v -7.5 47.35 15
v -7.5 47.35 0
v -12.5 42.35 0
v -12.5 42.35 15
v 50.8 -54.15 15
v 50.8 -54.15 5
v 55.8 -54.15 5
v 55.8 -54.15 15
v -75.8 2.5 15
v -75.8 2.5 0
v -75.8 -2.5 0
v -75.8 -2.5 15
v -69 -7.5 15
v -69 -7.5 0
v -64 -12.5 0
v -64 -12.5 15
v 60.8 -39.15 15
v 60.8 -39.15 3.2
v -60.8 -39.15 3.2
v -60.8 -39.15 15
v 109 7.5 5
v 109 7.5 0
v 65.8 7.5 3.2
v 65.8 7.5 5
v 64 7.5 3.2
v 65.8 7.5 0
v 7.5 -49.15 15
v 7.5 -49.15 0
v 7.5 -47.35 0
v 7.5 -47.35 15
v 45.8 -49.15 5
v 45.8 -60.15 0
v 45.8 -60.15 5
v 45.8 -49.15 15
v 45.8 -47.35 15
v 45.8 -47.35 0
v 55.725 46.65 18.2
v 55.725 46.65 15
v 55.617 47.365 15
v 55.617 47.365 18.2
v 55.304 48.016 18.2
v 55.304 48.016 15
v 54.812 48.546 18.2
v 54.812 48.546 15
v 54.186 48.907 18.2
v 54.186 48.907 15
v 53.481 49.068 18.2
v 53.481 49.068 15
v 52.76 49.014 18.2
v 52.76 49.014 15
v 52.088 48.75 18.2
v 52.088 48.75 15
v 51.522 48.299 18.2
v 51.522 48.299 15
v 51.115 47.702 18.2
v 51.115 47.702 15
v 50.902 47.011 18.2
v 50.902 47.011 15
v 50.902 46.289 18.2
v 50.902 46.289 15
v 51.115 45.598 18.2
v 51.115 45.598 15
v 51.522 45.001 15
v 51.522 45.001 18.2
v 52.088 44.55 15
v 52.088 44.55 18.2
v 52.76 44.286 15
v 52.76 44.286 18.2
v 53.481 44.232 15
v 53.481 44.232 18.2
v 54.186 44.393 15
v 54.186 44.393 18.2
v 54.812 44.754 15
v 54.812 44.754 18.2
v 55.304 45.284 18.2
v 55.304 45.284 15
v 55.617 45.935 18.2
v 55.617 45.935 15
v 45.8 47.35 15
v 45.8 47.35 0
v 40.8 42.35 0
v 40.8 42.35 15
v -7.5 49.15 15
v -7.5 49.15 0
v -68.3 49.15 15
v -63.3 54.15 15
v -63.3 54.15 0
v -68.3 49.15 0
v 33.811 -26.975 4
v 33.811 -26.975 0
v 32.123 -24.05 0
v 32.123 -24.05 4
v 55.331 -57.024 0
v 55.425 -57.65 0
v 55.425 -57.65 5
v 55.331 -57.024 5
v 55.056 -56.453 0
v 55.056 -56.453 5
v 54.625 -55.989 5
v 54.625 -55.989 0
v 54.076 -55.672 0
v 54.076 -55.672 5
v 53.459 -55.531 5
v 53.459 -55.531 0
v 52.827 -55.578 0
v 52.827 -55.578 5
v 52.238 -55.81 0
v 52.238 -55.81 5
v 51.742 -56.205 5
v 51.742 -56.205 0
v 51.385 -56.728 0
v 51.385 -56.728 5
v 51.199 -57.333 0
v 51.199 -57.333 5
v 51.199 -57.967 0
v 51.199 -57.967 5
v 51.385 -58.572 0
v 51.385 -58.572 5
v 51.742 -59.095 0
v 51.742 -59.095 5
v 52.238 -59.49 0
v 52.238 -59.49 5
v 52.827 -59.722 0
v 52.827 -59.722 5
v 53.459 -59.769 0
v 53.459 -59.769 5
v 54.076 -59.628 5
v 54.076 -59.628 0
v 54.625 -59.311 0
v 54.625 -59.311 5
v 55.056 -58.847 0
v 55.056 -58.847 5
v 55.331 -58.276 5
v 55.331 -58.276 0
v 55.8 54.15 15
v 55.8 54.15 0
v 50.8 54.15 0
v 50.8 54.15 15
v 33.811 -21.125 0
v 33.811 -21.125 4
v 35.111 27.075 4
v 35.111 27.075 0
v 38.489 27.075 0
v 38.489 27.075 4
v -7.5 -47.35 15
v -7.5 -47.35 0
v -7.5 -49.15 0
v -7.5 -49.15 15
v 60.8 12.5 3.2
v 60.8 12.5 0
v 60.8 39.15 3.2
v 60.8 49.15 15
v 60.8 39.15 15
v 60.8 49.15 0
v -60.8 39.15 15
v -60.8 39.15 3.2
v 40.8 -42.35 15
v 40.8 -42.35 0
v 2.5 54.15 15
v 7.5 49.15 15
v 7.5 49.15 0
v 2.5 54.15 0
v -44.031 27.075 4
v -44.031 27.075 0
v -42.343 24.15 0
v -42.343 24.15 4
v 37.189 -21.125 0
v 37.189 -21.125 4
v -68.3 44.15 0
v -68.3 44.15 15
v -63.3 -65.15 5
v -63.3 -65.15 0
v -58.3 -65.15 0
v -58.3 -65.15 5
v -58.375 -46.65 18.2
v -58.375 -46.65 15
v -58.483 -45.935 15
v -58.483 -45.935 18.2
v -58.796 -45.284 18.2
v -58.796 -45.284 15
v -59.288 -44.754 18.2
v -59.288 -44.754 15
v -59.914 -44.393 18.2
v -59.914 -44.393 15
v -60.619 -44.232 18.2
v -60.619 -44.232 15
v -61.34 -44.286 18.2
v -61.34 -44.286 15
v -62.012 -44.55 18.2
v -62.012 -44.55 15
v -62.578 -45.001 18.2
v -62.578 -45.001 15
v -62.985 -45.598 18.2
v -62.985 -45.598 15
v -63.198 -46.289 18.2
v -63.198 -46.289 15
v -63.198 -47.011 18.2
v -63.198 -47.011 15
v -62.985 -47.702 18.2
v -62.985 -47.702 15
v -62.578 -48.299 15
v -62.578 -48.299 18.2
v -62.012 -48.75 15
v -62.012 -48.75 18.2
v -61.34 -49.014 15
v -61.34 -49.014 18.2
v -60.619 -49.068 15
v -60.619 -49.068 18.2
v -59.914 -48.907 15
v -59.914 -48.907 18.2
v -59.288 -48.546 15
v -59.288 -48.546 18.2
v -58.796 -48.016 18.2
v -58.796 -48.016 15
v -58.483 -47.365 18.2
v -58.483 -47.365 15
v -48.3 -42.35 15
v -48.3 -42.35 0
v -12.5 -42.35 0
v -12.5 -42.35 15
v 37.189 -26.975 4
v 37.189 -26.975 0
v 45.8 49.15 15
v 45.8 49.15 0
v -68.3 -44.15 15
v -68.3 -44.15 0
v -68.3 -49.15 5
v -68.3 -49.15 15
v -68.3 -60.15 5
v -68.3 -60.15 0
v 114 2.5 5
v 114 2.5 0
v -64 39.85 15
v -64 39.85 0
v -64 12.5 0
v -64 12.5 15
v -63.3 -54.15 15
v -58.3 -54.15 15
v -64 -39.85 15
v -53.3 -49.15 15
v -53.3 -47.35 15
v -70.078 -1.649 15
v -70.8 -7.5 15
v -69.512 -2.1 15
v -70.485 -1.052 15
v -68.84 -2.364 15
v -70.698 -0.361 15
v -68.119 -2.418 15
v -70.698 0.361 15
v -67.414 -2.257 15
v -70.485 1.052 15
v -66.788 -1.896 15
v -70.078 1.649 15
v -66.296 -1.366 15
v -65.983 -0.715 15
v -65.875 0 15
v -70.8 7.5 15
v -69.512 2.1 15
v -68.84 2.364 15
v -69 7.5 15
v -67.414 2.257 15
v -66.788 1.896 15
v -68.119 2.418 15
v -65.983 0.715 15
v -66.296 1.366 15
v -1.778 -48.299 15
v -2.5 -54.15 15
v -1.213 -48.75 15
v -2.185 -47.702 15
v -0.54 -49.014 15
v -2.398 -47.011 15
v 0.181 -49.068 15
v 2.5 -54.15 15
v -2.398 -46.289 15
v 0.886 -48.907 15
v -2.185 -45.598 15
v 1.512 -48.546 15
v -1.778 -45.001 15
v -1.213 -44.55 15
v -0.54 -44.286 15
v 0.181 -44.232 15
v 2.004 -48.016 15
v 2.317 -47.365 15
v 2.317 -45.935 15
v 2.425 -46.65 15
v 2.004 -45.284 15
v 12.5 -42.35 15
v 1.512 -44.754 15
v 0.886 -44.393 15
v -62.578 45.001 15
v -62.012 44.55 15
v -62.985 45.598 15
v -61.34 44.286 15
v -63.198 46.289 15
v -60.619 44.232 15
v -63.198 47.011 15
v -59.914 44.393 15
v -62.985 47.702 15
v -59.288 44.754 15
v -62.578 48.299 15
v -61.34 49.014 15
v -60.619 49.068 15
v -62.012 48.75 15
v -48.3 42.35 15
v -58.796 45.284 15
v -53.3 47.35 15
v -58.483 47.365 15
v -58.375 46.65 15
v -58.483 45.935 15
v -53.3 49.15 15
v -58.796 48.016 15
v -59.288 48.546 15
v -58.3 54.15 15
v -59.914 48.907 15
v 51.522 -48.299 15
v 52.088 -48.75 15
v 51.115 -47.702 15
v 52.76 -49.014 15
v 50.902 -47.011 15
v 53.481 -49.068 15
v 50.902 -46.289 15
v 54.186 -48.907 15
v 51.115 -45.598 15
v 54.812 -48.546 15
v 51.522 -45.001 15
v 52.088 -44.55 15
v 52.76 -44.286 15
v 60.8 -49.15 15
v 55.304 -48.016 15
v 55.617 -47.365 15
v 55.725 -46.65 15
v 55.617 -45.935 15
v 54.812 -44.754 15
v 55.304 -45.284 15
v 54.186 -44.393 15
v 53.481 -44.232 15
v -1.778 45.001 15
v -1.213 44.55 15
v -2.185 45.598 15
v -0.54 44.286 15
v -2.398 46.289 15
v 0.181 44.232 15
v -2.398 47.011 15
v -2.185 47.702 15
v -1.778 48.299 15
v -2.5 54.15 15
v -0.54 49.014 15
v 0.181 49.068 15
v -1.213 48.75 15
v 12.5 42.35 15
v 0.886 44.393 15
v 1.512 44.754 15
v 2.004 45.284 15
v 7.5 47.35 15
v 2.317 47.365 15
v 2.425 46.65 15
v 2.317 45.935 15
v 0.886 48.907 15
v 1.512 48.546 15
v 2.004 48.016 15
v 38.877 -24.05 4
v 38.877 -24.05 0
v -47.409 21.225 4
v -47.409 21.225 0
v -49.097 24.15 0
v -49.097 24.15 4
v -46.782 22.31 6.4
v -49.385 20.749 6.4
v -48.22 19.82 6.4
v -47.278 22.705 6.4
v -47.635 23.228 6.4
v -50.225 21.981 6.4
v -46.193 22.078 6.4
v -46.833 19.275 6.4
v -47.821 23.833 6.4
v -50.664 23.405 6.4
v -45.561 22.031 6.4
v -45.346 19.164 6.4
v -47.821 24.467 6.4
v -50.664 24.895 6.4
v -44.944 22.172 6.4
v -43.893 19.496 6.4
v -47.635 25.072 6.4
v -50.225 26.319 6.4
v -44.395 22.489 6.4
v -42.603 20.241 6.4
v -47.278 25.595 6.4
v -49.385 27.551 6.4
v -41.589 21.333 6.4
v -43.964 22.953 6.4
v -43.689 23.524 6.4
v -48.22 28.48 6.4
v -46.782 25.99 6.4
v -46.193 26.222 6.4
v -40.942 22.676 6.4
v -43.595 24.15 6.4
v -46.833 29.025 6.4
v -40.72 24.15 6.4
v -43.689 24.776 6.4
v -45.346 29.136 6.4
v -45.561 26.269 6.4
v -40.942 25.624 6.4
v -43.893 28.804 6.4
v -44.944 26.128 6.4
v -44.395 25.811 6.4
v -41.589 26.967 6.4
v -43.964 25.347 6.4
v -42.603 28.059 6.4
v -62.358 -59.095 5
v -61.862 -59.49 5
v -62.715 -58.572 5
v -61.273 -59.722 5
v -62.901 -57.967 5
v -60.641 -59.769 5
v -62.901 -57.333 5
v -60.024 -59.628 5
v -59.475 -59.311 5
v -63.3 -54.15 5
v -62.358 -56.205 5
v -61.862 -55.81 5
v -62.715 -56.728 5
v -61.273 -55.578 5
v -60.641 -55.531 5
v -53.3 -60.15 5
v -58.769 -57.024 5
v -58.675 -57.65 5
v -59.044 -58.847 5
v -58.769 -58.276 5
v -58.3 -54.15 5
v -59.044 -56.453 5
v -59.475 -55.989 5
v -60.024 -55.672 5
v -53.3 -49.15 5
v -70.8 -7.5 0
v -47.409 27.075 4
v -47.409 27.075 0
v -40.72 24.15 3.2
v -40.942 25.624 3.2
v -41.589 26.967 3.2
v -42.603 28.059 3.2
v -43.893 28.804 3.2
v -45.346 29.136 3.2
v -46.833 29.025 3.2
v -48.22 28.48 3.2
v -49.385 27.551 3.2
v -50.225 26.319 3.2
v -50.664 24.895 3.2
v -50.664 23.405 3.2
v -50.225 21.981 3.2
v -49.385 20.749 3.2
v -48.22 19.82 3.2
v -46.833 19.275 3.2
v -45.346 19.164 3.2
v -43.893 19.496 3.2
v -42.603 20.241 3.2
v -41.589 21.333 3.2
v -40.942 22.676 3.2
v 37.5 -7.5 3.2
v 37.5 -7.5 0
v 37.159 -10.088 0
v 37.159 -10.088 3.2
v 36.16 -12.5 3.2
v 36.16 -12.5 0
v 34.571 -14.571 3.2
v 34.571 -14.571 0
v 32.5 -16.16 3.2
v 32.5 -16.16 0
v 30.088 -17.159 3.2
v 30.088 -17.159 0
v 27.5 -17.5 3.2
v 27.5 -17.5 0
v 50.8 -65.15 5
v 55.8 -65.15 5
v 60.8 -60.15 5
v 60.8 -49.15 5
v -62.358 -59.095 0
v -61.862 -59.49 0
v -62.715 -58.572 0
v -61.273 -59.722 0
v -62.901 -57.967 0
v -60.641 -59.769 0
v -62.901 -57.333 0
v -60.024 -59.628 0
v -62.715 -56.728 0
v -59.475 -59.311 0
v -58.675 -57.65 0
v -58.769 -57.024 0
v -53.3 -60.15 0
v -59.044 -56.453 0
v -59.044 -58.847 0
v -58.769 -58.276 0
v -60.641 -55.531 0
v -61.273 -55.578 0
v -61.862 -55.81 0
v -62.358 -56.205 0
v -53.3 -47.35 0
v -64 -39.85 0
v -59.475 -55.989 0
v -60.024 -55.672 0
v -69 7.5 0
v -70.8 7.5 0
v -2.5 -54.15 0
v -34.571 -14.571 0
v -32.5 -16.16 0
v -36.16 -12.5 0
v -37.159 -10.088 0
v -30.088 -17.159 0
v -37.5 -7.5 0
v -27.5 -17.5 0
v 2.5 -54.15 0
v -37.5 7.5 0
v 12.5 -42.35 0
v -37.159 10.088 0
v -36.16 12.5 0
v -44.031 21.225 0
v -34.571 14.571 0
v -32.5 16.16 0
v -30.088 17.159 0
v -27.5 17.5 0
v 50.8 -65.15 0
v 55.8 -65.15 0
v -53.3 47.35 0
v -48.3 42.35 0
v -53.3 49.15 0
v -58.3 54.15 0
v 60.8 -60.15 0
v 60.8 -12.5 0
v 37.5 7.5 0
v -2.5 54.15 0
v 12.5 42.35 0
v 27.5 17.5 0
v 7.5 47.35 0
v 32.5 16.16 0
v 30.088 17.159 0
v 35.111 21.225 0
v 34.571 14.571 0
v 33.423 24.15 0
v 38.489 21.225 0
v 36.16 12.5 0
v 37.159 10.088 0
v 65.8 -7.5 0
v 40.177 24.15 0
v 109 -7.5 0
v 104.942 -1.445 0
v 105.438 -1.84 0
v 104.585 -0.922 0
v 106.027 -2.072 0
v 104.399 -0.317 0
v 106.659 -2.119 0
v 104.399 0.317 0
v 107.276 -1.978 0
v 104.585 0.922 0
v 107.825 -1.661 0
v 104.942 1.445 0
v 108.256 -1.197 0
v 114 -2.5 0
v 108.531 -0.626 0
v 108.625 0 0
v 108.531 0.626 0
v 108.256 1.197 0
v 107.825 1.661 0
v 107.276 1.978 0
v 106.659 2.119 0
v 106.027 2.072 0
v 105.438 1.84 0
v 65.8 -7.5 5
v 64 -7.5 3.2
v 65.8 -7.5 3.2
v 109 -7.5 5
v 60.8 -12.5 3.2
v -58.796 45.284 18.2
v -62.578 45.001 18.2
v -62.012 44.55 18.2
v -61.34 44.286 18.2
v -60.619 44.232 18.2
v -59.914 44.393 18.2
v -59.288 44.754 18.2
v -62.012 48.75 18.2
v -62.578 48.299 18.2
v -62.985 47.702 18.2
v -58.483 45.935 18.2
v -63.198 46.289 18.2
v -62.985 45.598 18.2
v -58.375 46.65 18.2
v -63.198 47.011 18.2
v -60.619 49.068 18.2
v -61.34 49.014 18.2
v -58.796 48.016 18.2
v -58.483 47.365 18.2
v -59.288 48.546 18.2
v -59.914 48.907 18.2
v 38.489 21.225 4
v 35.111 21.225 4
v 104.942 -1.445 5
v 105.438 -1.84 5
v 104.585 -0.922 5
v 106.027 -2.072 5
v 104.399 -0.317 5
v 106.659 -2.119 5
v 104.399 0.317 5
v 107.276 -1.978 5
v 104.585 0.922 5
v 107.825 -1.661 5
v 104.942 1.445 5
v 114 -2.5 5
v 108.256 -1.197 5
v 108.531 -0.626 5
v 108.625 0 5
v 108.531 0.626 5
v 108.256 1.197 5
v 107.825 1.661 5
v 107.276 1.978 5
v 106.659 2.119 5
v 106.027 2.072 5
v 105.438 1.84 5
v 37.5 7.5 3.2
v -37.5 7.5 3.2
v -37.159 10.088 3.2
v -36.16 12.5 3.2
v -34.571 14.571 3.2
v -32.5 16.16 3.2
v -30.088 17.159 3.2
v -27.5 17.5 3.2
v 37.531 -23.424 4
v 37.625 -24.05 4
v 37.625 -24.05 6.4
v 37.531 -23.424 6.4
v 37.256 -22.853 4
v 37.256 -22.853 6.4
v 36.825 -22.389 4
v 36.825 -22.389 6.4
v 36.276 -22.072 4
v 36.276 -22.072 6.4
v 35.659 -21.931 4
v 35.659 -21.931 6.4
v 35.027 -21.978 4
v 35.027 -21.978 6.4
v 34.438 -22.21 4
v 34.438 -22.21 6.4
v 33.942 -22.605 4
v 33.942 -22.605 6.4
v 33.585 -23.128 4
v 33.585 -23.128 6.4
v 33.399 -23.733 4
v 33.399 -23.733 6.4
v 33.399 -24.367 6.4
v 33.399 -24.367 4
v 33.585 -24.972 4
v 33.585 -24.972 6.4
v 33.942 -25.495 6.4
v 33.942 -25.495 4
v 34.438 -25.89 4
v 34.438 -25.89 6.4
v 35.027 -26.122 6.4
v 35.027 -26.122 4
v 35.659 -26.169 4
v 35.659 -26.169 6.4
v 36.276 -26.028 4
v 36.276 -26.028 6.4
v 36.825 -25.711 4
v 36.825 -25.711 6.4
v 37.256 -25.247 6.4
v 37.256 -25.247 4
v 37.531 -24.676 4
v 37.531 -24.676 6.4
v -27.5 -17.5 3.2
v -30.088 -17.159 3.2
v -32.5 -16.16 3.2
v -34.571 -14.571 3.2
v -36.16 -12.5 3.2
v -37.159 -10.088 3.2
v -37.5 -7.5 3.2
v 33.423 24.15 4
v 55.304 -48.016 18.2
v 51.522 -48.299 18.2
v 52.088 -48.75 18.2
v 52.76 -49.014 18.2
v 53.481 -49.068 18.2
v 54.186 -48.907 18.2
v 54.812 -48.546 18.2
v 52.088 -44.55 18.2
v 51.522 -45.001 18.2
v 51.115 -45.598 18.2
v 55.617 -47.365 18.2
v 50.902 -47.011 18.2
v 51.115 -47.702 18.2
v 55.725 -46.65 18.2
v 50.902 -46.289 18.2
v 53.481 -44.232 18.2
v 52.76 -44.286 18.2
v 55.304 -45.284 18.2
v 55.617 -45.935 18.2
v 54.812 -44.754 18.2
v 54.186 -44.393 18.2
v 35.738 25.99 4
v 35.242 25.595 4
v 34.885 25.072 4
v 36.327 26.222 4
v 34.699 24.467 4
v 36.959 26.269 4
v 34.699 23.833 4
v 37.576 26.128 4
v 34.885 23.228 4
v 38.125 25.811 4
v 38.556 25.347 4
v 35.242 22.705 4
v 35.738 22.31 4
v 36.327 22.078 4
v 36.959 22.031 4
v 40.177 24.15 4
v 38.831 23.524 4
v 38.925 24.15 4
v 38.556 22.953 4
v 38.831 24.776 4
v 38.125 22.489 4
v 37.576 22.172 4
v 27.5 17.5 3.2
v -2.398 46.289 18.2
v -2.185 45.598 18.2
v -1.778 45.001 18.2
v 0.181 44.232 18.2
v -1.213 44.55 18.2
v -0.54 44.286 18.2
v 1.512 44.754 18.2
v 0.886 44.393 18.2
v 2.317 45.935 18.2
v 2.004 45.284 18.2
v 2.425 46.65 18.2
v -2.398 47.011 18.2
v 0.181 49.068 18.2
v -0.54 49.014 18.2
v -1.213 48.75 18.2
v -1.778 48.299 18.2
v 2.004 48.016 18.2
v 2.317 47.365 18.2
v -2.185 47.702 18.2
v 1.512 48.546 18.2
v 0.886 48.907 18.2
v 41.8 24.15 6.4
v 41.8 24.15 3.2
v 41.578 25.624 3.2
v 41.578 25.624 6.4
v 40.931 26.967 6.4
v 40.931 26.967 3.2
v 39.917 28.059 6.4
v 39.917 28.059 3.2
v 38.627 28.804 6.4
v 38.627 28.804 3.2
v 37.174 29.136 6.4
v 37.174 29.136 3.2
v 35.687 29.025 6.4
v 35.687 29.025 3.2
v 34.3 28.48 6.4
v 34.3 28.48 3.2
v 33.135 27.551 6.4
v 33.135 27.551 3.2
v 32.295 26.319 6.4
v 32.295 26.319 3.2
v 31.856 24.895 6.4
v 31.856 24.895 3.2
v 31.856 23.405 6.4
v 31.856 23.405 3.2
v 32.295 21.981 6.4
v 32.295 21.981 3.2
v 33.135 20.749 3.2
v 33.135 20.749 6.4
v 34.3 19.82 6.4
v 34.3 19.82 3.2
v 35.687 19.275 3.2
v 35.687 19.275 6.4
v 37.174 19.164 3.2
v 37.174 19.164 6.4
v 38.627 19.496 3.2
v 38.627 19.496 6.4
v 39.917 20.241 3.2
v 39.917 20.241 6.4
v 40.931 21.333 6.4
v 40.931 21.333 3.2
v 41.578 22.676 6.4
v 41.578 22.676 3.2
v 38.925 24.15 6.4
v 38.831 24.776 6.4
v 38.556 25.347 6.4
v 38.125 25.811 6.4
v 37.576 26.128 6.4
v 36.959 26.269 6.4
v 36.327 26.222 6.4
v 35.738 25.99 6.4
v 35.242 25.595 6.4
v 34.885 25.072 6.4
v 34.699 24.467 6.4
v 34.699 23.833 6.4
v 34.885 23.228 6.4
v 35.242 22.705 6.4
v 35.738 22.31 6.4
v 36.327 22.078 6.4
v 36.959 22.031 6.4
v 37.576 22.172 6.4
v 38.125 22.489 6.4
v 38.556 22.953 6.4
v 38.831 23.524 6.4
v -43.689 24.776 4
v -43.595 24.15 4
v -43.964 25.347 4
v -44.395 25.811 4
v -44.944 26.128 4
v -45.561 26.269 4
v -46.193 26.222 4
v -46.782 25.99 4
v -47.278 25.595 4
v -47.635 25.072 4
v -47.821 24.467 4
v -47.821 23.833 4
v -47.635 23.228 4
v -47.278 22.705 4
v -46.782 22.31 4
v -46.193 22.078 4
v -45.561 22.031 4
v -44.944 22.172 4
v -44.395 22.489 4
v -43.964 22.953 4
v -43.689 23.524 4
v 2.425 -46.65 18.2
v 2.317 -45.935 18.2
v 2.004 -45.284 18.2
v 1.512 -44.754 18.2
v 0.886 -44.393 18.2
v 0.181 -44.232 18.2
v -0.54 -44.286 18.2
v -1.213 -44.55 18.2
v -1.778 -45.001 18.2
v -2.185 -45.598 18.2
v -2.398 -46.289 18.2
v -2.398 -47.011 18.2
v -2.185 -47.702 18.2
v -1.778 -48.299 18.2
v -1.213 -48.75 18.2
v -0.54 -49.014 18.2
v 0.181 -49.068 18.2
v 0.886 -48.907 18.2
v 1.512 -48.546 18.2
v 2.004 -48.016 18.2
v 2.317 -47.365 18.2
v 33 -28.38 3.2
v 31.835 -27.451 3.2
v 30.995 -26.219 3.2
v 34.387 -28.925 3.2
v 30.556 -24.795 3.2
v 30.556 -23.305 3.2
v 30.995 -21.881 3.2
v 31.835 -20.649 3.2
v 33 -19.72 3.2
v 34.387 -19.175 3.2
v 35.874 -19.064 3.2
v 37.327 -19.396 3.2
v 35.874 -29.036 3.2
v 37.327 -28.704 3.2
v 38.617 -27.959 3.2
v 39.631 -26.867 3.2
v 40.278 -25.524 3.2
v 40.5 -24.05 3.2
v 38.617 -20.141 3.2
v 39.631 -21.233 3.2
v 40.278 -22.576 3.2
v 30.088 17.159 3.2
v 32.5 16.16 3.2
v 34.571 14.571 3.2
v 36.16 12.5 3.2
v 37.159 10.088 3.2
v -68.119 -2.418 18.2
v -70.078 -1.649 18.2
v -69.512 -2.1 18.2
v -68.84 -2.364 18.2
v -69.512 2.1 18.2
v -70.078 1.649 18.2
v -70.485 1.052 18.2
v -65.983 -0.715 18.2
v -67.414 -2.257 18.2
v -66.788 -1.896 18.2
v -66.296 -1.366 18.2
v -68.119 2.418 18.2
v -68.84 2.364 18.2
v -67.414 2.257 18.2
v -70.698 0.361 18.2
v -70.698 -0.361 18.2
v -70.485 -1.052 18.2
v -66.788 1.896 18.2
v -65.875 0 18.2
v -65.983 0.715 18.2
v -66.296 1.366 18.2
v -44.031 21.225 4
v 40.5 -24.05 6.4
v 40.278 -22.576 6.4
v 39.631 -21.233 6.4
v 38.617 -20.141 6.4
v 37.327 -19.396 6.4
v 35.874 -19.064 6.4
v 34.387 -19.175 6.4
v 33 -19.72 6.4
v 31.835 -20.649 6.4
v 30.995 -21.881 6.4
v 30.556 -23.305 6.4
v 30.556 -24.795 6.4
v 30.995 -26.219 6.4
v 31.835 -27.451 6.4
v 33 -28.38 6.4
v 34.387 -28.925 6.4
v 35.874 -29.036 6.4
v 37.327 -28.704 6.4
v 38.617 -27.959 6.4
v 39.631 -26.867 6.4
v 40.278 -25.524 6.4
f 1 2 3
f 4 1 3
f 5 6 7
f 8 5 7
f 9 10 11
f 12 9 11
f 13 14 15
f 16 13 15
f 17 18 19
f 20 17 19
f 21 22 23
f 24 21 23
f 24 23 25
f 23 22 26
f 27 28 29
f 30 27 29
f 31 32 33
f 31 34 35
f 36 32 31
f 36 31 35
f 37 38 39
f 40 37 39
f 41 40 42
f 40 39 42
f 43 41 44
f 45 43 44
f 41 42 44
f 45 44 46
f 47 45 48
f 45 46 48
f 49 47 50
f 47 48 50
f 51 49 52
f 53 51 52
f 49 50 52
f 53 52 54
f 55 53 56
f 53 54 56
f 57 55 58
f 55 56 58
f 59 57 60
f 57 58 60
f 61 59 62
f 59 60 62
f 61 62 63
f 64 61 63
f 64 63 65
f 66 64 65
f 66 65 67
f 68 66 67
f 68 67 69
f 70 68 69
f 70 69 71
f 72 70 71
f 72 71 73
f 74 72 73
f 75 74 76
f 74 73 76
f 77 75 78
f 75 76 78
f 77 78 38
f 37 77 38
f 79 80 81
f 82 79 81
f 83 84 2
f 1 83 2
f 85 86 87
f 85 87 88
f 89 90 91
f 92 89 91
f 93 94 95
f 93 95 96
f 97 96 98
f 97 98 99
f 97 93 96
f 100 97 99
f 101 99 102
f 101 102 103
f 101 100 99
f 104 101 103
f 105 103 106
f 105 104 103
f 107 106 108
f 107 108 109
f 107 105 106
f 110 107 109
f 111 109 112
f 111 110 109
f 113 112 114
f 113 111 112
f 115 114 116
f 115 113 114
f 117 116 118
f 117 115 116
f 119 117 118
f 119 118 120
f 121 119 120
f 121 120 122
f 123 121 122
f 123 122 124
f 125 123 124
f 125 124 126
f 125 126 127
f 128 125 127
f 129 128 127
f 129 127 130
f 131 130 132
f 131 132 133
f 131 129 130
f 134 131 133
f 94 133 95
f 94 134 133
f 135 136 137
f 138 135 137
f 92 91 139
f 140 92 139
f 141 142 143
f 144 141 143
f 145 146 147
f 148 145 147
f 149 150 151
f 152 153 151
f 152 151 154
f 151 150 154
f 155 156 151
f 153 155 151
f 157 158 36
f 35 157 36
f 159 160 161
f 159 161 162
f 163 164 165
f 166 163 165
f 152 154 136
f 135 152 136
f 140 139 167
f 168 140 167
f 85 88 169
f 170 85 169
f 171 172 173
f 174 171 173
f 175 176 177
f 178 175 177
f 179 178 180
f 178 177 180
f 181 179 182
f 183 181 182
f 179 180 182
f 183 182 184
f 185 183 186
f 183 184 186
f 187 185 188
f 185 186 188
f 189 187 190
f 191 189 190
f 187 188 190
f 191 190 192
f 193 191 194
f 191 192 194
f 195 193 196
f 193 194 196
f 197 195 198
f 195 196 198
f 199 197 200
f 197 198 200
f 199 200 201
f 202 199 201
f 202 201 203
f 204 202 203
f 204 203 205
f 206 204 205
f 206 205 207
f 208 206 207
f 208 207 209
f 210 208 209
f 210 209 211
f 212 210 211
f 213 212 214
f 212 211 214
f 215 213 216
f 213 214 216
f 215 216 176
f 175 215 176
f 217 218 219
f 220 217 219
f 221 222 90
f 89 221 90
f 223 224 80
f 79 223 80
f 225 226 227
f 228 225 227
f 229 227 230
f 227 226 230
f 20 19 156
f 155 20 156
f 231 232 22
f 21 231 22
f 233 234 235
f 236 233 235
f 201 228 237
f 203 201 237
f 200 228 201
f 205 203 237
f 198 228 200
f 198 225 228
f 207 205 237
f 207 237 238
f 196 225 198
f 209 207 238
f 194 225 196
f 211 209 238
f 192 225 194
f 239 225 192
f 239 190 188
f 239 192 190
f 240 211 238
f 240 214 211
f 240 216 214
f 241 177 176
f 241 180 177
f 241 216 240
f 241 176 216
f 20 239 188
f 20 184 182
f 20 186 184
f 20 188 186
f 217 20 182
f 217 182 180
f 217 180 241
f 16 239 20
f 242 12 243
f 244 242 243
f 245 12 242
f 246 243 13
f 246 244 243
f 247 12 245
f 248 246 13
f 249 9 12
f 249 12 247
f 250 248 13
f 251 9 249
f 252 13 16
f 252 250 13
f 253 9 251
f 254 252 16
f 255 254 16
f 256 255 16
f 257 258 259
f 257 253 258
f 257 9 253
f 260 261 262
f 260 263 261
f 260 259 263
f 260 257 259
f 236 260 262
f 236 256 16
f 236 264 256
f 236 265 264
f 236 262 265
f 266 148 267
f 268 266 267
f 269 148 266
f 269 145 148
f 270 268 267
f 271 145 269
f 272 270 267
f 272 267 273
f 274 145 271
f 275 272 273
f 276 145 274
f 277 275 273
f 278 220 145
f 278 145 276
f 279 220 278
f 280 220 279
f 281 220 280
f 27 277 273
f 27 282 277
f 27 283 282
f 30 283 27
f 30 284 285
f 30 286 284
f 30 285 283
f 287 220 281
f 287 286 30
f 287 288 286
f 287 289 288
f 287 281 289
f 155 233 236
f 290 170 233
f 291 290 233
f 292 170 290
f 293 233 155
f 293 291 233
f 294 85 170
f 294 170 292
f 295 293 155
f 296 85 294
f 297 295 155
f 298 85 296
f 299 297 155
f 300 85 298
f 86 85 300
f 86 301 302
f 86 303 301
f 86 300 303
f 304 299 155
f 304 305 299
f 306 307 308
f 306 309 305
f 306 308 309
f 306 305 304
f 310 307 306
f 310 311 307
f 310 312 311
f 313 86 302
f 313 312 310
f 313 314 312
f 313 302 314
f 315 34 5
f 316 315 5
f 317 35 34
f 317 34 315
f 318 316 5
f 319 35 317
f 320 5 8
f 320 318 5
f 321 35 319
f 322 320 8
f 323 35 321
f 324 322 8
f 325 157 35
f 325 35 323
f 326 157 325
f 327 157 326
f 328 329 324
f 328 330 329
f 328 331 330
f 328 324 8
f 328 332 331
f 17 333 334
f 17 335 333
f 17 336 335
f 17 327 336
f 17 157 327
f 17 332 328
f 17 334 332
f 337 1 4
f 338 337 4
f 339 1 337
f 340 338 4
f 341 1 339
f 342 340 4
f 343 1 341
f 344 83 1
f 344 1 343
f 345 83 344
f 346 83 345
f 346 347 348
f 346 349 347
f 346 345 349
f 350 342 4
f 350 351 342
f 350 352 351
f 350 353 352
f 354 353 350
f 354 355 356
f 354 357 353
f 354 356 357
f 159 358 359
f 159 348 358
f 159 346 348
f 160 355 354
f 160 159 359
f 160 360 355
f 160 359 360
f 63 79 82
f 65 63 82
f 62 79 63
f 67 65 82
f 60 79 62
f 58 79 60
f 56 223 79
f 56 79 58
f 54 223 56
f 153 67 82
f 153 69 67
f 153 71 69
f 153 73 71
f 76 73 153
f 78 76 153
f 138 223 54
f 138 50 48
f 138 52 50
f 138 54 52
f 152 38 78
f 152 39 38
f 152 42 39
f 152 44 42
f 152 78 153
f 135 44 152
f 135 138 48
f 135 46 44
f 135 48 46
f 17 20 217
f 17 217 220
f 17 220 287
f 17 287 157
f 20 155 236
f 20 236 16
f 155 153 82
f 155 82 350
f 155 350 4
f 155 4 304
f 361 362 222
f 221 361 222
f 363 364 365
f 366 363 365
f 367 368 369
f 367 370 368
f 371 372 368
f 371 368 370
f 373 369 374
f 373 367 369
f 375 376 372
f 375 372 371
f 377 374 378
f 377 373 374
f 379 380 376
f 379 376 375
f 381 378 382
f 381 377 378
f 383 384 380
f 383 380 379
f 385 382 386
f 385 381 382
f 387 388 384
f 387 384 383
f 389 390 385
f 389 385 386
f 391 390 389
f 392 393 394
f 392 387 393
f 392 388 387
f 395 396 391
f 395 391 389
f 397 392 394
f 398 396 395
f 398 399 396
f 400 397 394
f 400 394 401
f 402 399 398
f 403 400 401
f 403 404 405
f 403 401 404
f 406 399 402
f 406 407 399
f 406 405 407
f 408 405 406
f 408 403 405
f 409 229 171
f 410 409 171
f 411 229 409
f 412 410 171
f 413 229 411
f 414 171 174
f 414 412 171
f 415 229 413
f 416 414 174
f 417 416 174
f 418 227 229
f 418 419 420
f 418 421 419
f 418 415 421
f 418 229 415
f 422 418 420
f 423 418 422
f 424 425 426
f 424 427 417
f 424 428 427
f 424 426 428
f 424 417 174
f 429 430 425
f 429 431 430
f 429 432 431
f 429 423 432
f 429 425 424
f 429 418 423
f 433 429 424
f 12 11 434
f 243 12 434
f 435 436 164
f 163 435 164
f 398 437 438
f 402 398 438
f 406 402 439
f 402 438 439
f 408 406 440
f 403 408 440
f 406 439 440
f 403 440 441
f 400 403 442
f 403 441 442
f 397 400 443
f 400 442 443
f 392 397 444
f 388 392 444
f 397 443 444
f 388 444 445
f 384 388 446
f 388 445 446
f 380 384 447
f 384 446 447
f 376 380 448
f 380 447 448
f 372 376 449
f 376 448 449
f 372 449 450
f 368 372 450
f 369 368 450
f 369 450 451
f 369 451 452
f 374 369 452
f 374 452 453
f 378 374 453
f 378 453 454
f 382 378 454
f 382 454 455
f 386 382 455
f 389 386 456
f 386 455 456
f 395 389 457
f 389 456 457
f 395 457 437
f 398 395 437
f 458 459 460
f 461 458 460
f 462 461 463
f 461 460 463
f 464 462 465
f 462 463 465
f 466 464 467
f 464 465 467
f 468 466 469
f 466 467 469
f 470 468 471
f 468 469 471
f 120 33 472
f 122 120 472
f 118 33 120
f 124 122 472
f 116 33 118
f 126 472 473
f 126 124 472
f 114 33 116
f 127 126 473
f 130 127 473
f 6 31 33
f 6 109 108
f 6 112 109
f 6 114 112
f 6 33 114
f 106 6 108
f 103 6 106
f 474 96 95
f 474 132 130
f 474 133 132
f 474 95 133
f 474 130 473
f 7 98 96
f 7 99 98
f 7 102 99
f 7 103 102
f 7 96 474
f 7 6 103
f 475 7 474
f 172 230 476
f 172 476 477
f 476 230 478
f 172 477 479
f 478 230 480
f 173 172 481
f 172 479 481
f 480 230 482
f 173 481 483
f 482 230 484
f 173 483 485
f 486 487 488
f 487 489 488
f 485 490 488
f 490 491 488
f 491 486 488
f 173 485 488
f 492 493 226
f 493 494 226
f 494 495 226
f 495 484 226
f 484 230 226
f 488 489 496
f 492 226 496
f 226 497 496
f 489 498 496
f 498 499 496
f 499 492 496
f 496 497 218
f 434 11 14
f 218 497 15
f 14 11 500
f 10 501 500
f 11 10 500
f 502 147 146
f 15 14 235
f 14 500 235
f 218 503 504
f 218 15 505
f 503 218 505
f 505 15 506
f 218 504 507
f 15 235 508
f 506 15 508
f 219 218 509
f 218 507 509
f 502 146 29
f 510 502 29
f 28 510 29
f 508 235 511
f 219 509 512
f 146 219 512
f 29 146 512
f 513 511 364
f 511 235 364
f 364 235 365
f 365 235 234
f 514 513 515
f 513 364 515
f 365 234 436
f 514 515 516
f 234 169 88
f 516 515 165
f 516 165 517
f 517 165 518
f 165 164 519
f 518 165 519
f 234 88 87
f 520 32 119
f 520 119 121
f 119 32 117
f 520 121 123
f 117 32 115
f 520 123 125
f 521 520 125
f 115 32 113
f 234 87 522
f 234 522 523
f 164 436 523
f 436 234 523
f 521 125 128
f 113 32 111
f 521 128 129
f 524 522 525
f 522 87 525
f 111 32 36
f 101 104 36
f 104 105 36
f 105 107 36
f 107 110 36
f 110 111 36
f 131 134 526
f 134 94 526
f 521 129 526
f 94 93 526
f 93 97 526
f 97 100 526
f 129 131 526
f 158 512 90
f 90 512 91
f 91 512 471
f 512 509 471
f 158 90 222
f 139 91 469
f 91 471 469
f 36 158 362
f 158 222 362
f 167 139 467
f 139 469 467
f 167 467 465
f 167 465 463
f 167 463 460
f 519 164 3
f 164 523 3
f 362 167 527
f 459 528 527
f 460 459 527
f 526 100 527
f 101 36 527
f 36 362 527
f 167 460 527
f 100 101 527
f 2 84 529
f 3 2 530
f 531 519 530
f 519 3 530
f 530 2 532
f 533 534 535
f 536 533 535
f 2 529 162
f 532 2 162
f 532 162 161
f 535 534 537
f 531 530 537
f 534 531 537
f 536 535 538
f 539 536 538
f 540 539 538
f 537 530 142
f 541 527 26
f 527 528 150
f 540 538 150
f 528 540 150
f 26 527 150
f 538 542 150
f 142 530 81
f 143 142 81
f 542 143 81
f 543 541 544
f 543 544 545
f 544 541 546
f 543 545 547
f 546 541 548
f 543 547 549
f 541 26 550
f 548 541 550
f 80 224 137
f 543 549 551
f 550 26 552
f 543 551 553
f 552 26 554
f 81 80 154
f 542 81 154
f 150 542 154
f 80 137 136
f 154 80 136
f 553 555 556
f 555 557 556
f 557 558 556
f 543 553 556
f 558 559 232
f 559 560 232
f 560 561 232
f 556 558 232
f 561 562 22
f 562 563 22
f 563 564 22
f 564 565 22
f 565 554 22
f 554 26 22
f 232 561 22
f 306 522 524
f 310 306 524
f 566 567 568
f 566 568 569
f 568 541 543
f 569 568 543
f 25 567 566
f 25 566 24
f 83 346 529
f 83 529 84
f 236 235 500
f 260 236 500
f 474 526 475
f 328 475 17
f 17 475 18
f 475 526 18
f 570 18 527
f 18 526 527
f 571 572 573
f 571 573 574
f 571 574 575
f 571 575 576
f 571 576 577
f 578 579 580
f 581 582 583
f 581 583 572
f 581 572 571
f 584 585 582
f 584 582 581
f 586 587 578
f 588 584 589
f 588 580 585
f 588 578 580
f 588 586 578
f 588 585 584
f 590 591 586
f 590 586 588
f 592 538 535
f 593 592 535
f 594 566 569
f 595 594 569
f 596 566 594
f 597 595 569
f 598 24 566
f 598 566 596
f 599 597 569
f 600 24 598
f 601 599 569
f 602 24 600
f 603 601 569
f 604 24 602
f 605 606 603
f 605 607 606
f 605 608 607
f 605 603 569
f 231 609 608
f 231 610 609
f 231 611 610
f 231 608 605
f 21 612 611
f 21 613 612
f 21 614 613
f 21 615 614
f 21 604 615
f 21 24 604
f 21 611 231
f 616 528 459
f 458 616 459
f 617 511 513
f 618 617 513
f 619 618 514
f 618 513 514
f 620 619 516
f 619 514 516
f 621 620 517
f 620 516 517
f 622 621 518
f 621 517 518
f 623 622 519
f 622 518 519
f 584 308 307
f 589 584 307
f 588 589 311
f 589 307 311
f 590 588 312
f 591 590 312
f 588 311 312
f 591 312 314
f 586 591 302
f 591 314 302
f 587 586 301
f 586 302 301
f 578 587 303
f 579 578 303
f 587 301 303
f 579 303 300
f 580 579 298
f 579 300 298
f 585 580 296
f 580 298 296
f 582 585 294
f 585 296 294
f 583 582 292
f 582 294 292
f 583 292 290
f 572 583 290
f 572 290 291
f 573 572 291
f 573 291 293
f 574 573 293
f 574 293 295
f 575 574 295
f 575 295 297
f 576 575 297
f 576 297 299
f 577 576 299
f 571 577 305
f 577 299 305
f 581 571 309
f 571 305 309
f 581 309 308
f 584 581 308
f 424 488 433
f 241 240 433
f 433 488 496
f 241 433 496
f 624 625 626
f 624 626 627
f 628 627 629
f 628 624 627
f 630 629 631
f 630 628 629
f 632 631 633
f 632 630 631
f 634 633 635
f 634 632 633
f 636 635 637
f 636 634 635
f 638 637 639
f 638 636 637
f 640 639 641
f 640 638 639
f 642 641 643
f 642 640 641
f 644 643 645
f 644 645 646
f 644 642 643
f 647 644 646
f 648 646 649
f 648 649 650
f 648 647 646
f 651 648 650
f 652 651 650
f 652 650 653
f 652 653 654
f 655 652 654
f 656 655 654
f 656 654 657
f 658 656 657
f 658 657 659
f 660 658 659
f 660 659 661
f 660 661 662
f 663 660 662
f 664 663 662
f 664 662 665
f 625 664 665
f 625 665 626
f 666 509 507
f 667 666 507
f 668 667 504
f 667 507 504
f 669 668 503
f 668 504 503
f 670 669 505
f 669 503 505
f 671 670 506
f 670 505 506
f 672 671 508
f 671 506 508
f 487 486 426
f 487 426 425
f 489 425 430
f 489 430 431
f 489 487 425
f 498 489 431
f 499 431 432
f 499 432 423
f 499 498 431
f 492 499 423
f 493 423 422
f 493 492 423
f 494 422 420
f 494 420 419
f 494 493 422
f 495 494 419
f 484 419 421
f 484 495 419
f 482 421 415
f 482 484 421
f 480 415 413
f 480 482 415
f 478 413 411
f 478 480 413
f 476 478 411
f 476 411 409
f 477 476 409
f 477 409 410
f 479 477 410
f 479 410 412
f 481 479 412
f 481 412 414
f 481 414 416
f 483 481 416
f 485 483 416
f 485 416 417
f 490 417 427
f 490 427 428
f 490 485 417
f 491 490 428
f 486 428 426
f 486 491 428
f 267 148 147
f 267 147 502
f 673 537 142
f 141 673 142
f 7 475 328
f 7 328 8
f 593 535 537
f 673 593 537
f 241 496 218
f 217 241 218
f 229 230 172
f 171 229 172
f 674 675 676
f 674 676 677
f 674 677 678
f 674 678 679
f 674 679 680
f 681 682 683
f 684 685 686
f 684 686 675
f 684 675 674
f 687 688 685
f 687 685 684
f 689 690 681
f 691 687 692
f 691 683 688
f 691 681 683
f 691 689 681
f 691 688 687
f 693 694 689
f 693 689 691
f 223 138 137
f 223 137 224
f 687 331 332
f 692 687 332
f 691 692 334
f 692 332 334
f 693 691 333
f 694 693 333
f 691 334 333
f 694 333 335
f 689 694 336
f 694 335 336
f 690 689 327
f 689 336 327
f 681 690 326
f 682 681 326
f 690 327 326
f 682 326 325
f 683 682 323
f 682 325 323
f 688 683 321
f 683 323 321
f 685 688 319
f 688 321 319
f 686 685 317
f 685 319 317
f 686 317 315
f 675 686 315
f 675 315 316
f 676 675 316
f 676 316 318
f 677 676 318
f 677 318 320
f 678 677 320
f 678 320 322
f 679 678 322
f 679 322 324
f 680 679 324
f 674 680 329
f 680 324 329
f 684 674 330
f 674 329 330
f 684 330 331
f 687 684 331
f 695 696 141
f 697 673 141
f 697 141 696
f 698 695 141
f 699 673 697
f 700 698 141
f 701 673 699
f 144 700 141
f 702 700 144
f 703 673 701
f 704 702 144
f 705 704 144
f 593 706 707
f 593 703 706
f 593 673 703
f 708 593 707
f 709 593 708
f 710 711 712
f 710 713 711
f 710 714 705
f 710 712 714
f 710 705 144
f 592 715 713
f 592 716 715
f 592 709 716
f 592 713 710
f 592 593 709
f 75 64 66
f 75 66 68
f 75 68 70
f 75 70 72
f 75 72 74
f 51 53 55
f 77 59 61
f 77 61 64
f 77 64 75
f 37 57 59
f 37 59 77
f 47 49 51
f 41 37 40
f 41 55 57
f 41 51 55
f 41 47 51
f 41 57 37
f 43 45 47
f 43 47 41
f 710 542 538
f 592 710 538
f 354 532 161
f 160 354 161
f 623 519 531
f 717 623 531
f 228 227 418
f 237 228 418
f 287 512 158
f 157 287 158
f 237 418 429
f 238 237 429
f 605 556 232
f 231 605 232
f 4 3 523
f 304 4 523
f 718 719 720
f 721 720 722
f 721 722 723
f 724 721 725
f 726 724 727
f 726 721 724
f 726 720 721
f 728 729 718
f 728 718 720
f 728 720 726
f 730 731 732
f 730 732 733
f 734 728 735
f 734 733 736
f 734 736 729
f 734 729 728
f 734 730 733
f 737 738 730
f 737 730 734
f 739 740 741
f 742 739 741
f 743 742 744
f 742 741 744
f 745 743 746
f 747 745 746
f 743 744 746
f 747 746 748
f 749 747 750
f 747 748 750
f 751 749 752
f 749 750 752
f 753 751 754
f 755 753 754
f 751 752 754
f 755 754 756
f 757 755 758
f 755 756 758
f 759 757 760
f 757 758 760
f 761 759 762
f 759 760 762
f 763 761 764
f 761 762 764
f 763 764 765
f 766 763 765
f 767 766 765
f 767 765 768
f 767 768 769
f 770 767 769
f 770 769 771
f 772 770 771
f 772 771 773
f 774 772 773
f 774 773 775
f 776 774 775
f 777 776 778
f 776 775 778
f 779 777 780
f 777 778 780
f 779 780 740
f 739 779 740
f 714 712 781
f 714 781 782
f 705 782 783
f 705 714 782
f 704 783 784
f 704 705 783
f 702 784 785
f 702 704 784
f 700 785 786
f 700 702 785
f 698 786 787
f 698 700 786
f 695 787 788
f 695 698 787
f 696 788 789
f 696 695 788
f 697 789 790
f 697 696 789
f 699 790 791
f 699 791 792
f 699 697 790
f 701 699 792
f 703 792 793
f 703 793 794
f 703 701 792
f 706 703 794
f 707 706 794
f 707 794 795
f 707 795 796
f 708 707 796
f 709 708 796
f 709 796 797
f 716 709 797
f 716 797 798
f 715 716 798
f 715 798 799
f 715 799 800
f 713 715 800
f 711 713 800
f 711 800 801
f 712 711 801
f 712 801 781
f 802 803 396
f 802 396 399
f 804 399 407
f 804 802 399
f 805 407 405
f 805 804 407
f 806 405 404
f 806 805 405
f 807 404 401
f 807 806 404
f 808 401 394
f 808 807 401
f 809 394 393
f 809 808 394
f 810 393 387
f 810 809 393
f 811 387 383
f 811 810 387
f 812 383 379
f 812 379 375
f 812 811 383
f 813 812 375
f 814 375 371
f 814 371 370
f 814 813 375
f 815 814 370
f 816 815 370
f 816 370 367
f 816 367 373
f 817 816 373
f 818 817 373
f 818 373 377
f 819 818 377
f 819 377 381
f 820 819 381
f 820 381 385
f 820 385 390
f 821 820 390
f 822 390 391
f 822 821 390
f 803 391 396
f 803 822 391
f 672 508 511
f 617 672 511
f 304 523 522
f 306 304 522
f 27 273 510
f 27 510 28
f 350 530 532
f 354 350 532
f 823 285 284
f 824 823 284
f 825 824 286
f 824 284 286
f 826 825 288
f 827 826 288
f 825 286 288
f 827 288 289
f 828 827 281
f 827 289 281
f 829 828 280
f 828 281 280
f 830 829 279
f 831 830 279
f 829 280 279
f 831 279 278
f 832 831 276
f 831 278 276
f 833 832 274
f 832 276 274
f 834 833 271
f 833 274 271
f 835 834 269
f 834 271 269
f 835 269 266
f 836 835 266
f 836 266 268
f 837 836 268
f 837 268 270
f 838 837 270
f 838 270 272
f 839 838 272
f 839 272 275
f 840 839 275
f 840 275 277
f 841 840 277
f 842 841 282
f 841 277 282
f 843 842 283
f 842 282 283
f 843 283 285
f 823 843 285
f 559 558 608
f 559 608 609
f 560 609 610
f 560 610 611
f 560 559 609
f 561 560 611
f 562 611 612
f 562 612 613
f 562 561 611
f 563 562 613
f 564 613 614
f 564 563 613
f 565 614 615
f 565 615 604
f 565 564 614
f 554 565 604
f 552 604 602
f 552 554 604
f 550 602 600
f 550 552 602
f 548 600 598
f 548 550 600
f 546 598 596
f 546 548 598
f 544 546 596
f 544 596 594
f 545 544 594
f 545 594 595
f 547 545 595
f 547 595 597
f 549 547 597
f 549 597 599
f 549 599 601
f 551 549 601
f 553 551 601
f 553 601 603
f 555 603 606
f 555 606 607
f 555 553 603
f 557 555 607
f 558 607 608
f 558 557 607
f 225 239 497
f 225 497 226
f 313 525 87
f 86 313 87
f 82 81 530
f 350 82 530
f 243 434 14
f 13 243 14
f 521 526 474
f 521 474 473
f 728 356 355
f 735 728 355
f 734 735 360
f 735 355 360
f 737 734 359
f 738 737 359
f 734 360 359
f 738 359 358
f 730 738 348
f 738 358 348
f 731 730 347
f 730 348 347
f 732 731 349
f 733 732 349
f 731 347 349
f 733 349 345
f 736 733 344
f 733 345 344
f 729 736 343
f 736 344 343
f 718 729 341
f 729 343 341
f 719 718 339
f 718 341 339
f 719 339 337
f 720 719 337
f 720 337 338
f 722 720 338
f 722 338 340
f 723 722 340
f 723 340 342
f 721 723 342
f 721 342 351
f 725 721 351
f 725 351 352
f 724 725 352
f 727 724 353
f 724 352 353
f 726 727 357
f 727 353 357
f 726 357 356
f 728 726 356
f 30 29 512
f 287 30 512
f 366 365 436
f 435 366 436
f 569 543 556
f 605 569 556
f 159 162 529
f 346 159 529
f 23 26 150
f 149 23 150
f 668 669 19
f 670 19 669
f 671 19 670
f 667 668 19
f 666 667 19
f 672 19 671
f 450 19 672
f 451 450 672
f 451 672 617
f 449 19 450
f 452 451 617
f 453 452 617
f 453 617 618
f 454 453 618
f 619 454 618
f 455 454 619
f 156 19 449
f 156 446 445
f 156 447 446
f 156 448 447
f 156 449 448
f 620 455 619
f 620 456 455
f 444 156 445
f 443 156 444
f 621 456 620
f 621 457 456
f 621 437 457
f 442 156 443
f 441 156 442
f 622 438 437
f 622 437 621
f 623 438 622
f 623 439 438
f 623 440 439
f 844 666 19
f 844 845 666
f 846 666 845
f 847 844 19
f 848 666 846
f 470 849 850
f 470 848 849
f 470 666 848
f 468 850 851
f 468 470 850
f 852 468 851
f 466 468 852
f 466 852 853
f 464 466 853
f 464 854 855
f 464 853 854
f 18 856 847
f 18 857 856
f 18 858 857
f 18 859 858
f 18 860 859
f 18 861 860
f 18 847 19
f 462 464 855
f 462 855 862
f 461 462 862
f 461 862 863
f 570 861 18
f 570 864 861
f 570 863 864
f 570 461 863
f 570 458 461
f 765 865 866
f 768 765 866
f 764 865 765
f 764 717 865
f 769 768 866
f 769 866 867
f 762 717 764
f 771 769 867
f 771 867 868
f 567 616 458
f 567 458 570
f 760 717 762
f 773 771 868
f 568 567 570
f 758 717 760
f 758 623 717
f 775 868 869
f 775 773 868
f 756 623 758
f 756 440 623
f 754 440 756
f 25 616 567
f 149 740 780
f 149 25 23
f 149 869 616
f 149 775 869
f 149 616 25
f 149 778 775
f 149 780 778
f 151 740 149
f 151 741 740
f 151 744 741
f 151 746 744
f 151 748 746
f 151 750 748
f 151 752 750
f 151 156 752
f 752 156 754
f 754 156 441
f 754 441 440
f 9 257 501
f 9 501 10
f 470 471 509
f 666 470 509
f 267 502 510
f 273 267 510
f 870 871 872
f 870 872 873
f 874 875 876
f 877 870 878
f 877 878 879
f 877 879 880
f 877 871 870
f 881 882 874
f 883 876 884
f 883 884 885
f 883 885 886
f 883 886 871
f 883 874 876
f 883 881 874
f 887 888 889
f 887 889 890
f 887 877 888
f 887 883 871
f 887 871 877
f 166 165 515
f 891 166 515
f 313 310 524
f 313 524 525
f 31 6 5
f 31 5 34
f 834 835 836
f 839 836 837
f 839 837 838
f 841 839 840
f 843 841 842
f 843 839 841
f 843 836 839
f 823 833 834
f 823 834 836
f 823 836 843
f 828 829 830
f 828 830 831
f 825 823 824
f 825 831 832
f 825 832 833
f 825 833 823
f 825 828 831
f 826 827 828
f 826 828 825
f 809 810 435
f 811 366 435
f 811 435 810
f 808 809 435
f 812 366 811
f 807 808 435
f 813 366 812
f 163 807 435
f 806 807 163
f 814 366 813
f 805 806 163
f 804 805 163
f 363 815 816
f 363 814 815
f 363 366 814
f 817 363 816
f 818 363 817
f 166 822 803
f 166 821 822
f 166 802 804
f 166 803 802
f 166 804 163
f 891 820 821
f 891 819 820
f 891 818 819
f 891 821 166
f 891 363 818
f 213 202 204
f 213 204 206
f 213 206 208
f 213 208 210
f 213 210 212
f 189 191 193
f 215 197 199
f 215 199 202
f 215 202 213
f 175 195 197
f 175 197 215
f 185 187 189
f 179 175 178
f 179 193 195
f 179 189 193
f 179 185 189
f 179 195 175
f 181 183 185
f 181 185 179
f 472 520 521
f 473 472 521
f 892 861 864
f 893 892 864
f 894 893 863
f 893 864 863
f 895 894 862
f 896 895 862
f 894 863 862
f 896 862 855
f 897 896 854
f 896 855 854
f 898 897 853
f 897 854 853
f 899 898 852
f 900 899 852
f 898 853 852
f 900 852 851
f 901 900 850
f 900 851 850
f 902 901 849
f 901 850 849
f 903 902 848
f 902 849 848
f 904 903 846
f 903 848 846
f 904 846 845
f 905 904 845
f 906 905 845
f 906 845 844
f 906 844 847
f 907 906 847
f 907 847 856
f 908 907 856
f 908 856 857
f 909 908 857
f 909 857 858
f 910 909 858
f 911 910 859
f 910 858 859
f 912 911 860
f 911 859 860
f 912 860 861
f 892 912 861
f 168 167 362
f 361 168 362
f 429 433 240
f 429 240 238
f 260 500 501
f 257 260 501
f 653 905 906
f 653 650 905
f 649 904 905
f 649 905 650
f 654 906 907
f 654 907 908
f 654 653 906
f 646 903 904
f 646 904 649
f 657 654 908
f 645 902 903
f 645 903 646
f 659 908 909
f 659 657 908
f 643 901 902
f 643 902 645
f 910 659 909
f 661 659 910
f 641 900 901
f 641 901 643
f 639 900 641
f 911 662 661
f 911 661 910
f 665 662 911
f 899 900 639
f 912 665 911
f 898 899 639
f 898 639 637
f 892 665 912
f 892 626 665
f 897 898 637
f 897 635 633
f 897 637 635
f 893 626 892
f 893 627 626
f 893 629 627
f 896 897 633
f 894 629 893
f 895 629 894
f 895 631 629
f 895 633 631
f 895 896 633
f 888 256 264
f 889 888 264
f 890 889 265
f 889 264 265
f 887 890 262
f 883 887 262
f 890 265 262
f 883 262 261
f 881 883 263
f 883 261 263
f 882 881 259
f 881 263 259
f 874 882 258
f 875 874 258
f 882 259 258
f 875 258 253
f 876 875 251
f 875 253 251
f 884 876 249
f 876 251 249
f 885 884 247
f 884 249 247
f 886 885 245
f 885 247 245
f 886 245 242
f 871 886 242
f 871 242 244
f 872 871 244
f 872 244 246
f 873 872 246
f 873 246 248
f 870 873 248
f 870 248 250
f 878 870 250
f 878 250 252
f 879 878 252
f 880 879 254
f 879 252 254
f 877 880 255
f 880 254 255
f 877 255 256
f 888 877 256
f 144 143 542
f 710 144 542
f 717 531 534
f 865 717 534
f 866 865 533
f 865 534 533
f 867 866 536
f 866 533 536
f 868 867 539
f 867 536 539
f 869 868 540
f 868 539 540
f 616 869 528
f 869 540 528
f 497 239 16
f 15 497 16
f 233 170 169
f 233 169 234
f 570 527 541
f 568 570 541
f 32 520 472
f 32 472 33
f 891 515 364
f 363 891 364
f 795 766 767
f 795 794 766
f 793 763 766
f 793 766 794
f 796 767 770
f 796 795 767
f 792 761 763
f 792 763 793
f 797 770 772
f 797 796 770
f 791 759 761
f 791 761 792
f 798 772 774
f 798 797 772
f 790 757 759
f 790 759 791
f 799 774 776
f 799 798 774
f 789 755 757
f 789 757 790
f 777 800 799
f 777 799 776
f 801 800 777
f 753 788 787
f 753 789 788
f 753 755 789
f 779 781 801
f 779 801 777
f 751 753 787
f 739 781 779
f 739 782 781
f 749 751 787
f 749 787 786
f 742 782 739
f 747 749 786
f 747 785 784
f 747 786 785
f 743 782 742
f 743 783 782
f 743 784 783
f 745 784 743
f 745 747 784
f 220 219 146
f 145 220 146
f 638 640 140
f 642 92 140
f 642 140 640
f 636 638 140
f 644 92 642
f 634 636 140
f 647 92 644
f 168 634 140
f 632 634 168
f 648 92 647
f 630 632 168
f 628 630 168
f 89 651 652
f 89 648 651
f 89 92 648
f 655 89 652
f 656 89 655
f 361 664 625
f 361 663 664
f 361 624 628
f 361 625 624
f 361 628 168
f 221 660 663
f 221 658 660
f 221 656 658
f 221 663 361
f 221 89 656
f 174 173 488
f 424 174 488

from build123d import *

# Parameters (mm, degrees)
F0_W          = 121.6
F0_H          = 78.3
F0_R          = 2.125
F1_DEPTH      = 3.2
F2_R          = 5
F2_R_2        = 2.125
F3_DEPTH      = 3.2
F5_DEPTH      = 4
F7_DEPTH      = 15
F8_R          = 2.425
F9_DEPTH      = 3.2
F11_W         = 15
F11_H         = 17.8
F11_R         = 2.125
F12_DEPTH     = 5
F13_T1_DEPTH  = 3.2
F13_T3_DEPTH  = 15
F13_T5_DEPTH  = 30.7168298797
F13_T7_DEPTH  = 22.8584149398
F13_T9_DEPTH  = 40.7168298797
F13_T14_DEPTH = 14.6584149398
F13_T19_DEPTH = 14.6584149398
F13_T24_DEPTH = 40.7168298797
F13_T29_DEPTH = 40.7168298797
F13_T34_DEPTH = 40.7168298797


# Not quite as in the source:
# - a fillet or chamfer that OpenCascade refuses, or shapes differently, is made with other operations: its cross-section is extruded or revolved along the edge and cut away or added
# - two fillets or chamfers of one size are made in one step
# - a feature of the source that left no trace in its solid (it failed there, or was rolled back) is left out
# - a feature names something its author has since deleted; it is built from what else it names


with BuildPart() as f1:
    # F0 (on Top) → F1 (new body)
    with BuildSketch(Plane.XY):
        Rectangle(F0_W, F0_H)
        with Locations((35.5, -24.05)):
            Circle(F0_R, mode=Mode.SUBTRACT)
        with BuildLine():
            ThreePointArc((37.5, -7.5), (34.5710678119, -14.5710678119), (27.5, -17.5))
            Line((27.5, -17.5), (-27.5, -17.5))
            ThreePointArc((-27.5, -17.5), (-34.5710678119, -14.5710678119), (-37.5, -7.5))
            Line((-37.5, -7.5), (-37.5, 7.5))
            ThreePointArc((-37.5, 7.5), (-34.5710678119, 14.5710678119), (-27.5, 17.5))
            Line((-27.5, 17.5), (27.5, 17.5))
            ThreePointArc((27.5, 17.5), (34.5710678119, 14.5710678119), (37.5, 7.5))
            Line((37.5, 7.5), (37.5, -7.5))
        make_face(mode=Mode.SUBTRACT)
        with Locations((-45.72, 24.15)):
            Circle(F0_R, mode=Mode.SUBTRACT)
        with Locations((36.8, 24.15)):
            Circle(F0_R, mode=Mode.SUBTRACT)
    extrude(amount=F1_DEPTH)

    # F2 (on face) → F3 (join)
    with BuildSketch(Plane.XY.offset(3.2)):
        with Locations((-45.72, 24.15)):
            Circle(F2_R)
        with Locations((-45.72, 24.15)):
            Circle(F2_R_2, mode=Mode.SUBTRACT)
        with Locations((36.8, 24.15)):
            Circle(F2_R)
        with Locations((36.8, 24.15)):
            Circle(F2_R_2, mode=Mode.SUBTRACT)
        with Locations((35.5, -24.05)):
            Circle(F2_R)
        with Locations((35.5, -24.05)):
            Circle(F2_R_2, mode=Mode.SUBTRACT)
    extrude(amount=F3_DEPTH)

    # F4 (on face) → F5 (cut)
    with BuildSketch(Plane(origin=(0, 0, 0), x_dir=(1, 0, 0), z_dir=(0, 0, -1))):
        Polygon((-44.0312504626, -21.225), (-47.4087495374, -21.225), (-49.0974990748, -24.15), (-47.4087495374, -27.075), (-44.0312504626, -27.075), (-42.3425009252, -24.15), align=None)
        Polygon((38.4887495374, -21.225), (35.1112504626, -21.225), (33.4225009252, -24.15), (35.1112504626, -27.075), (38.4887495374, -27.075), (40.1774990748, -24.15), align=None)
        Polygon((33.8112504626, 21.125), (37.1887495374, 21.125), (38.8774990748, 24.05), (37.1887495374, 26.975), (33.8112504626, 26.975), (32.1225009252, 24.05), align=None)
    extrude(amount=-F5_DEPTH, mode=Mode.SUBTRACT)

    # F6 (on Top) → F7 (join)
    with BuildSketch(Plane.XY):
        Polygon((-60.8, 39.15), (60.8, 39.15), (60.8, 54.15), (45.8, 54.15), (45.8, 42.35), (7.5, 42.35), (7.5, 54.15), (-7.5, 54.15), (-7.5, 42.35), (-53.3, 42.35), (-53.3, 54.15), (-68.3, 54.15), (-68.3, 39.15), (-64, 39.15), (-64, 7.5), (-75.8, 7.5), (-75.8, -7.5), (-64, -7.5), (-64, -39.15), (-68.3, -39.15), (-68.3, -54.15), (-53.3, -54.15), (-53.3, -42.35), (-7.5, -42.35), (-7.5, -54.15), (7.5, -54.15), (7.5, -42.35), (45.8, -42.35), (45.8, -54.15), (60.8, -54.15), (60.8, -39.15), (-60.8, -39.15), align=None)
    extrude(amount=F7_DEPTH)

    # F8 (on face) → F9 (join)
    with BuildSketch(Plane.XY.offset(15)):
        with Locations((53.3, 46.65)):
            Circle(F8_R)
        with Locations((0, 46.65)):
            Circle(F8_R)
        with Locations((-60.8, 46.65)):
            Circle(F8_R)
        with Locations((-68.3, 0)):
            Circle(F8_R)
        with Locations((-60.8, -46.65)):
            Circle(F8_R)
        with Locations((0, -46.65)):
            Circle(F8_R)
        with Locations((53.3, -46.65)):
            Circle(F8_R)
    extrude(amount=F9_DEPTH)

    # F11 (on Top) → F12 (join)
    with BuildSketch(Plane.XY):
        with Locations((53.3, -56.25)):
            Rectangle(F11_W, F11_H)
        with Locations((53.3, -57.65)):
            Circle(F11_R, mode=Mode.SUBTRACT)
        with Locations((-60.8, -56.25)):
            Rectangle(F11_W, F11_H)
        with Locations((-60.8, -57.65)):
            Circle(F11_R, mode=Mode.SUBTRACT)
        Polygon((60.8, -7.5), (64, -7.5), (114, -7.5), (114, 7.5), (64, 7.5), (60.8, 7.5), align=None)
        with Locations((106.5, 0)):
            Circle(F11_R, mode=Mode.SUBTRACT)
    extrude(amount=F12_DEPTH)

    # F13: chamfer of 5 on 37 edges, made by hand

    # F13_s2 → F13_t1 (join)
    with BuildSketch(Plane.XY):
        Polygon((65.8, 7.5), (60.8, 12.5), (60.8, 7.5), align=None)
        Polygon((60.8, -12.5), (65.8, -7.5), (60.8, -7.5), align=None)
    extrude(amount=F13_T1_DEPTH)

    # F13_s4 → F13_t3 (join)
    with BuildSketch(Plane.XY):
        Polygon((45.8, 47.35), (40.8, 42.35), (45.8, 42.35), align=None)
        Polygon((12.5, 42.35), (7.5, 47.35), (7.5, 42.35), align=None)
        Polygon((-7.5, 47.35), (-12.5, 42.35), (-7.5, 42.35), align=None)
        Polygon((-48.3, 42.35), (-53.3, 47.35), (-53.3, 42.35), align=None)
        Polygon((-64, 12.5), (-69, 7.5), (-64, 7.5), align=None)
        Polygon((-69, -7.5), (-64, -12.5), (-64, -7.5), align=None)
        Polygon((-53.3, -47.35), (-48.3, -42.35), (-53.3, -42.35), align=None)
        Polygon((-12.5, -42.35), (-7.5, -47.35), (-7.5, -42.35), align=None)
        Polygon((7.5, -47.35), (12.5, -42.35), (7.5, -42.35), align=None)
        Polygon((40.8, -42.35), (45.8, -47.35), (45.8, -42.35), align=None)
    extrude(amount=F13_T3_DEPTH)

    # F13_s6 → F13_t5 (cut)
    with BuildSketch(Plane.XY.offset(-12.8584149398)):
        Polygon((-68.3, -60.15), (-63.3, -65.15), (-68.3, -65.15), align=None)
        Polygon((-58.3, -65.15), (-53.3, -60.15), (-53.3, -65.15), align=None)
        Polygon((50.8, -65.15), (45.8, -60.15), (45.8, -65.15), align=None)
        Polygon((60.8, -60.15), (55.8, -65.15), (60.8, -65.15), align=None)
        Polygon((114, 2.5), (109, 7.5), (114, 7.5), align=None)
        Polygon((109, -7.5), (114, -2.5), (114, -7.5), align=None)
    extrude(amount=F13_T5_DEPTH, mode=Mode.SUBTRACT)

    # F13_s8 → F13_t7 (cut)
    with BuildSketch(Plane.XY.offset(5)):
        Polygon((60.8, -49.15), (55.8, -54.15), (60.8, -54.15), align=None)
        Polygon((-68.3, -49.15), (-63.3, -54.15), (-68.3, -54.15), align=None)
        Polygon((-53.3, -49.15), (-58.3, -54.15), (-53.3, -54.15), align=None)
        Polygon((50.8, -54.15), (45.8, -49.15), (45.8, -54.15), align=None)
    extrude(amount=F13_T7_DEPTH, mode=Mode.SUBTRACT)

    # F13_s10 → F13_t9 (cut)
    with BuildSketch(Plane.XY.offset(-12.8584149398)):
        Polygon((60.8, 49.15), (55.8, 54.15), (60.8, 54.15), align=None)
        Polygon((50.8, 54.15), (45.8, 49.15), (45.8, 54.15), align=None)
        Polygon((7.5, 49.15), (2.5, 54.15), (7.5, 54.15), align=None)
        Polygon((-2.5, 54.15), (-7.5, 49.15), (-7.5, 54.15), align=None)
        Polygon((-53.3, 49.15), (-58.3, 54.15), (-53.3, 54.15), align=None)
        Polygon((-63.3, 54.15), (-68.3, 49.15), (-68.3, 54.15), align=None)
        Polygon((-70.8, 7.5), (-75.8, 2.5), (-75.8, 7.5), align=None)
        Polygon((-75.8, -2.5), (-70.8, -7.5), (-75.8, -7.5), align=None)
        Polygon((-7.5, -49.15), (-2.5, -54.15), (-7.5, -54.15), align=None)
        Polygon((2.5, -54.15), (7.5, -49.15), (7.5, -54.15), align=None)
    extrude(amount=F13_T9_DEPTH, mode=Mode.SUBTRACT)


with BuildPart() as f13_tool12:
    # F13_s13 → F13_t14 (new body)
    with BuildSketch(Plane.XY.offset(3.2)):
        Polygon((65.8, 7.5), (60.8, 2.5), (60.8, 7.5), align=None)
    extrude(amount=F13_T14_DEPTH)

    split(bisect_by=Plane(origin=(30.4, 0, -30.4), x_dir=(0, 1, 0), z_dir=(-0.7071067812, 0, 0.7071067812)), keep=Keep.TOP)


with BuildPart() as f1_1:
    add(f1.part)

    # F13_t11: cut F13_tool12
    add(f13_tool12.part, mode=Mode.SUBTRACT)


with BuildPart() as f13_tool17:
    # F13_s18 → F13_t19 (new body)
    with BuildSketch(Plane.XY.offset(3.2)):
        Polygon((65.8, -7.5), (60.8, -2.5), (60.8, -7.5), align=None)
    extrude(amount=F13_T19_DEPTH)

    split(bisect_by=Plane(origin=(30.4, 0, -30.4), x_dir=(0, 1, 0), z_dir=(-0.7071067812, 0, 0.7071067812)), keep=Keep.TOP)


with BuildPart() as f1_2:
    add(f1_1.part)

    # F13_t16: cut F13_tool17
    add(f13_tool17.part, mode=Mode.SUBTRACT)


with BuildPart() as f13_tool22:
    # F13_s23 → F13_t24 (new body)
    with BuildSketch(Plane.XZ.offset(-20.3584149398)):
        Polygon((60.8, 0), (65.8, 5), (60.8, 5), align=None)
    extrude(amount=F13_T24_DEPTH)

    split(bisect_by=Plane.XY.offset(3.2), keep=Keep.TOP)


with BuildPart() as f1_3:
    add(f1_2.part)

    # F13_t21: cut F13_tool22
    add(f13_tool22.part, mode=Mode.SUBTRACT)


with BuildPart() as f13_tool27:
    # F13_s28 → F13_t29 (new body)
    with BuildSketch(Plane.XY.offset(-12.8584149398)):
        Polygon((-68.3, 44.15), (-63.3, 39.15), (-68.3, 39.15), align=None)
    extrude(amount=F13_T29_DEPTH)

    split(bisect_by=Plane.YZ.offset(-64), keep=Keep.BOTTOM)


with BuildPart() as f1_4:
    add(f1_3.part)

    # F13_t26: cut F13_tool27
    add(f13_tool27.part, mode=Mode.SUBTRACT)


with BuildPart() as f13_tool32:
    # F13_s33 → F13_t34 (new body)
    with BuildSketch(Plane.XY.offset(-12.8584149398)):
        Polygon((-63.3, -39.15), (-68.3, -44.15), (-68.3, -39.15), align=None)
    extrude(amount=F13_T34_DEPTH)

    split(bisect_by=Plane.YZ.offset(-64), keep=Keep.BOTTOM)


with BuildPart() as f1_5:
    add(f1_4.part)

    # F13_t31: cut F13_tool32
    add(f13_tool32.part, mode=Mode.SUBTRACT)


solid = f1_5.part
